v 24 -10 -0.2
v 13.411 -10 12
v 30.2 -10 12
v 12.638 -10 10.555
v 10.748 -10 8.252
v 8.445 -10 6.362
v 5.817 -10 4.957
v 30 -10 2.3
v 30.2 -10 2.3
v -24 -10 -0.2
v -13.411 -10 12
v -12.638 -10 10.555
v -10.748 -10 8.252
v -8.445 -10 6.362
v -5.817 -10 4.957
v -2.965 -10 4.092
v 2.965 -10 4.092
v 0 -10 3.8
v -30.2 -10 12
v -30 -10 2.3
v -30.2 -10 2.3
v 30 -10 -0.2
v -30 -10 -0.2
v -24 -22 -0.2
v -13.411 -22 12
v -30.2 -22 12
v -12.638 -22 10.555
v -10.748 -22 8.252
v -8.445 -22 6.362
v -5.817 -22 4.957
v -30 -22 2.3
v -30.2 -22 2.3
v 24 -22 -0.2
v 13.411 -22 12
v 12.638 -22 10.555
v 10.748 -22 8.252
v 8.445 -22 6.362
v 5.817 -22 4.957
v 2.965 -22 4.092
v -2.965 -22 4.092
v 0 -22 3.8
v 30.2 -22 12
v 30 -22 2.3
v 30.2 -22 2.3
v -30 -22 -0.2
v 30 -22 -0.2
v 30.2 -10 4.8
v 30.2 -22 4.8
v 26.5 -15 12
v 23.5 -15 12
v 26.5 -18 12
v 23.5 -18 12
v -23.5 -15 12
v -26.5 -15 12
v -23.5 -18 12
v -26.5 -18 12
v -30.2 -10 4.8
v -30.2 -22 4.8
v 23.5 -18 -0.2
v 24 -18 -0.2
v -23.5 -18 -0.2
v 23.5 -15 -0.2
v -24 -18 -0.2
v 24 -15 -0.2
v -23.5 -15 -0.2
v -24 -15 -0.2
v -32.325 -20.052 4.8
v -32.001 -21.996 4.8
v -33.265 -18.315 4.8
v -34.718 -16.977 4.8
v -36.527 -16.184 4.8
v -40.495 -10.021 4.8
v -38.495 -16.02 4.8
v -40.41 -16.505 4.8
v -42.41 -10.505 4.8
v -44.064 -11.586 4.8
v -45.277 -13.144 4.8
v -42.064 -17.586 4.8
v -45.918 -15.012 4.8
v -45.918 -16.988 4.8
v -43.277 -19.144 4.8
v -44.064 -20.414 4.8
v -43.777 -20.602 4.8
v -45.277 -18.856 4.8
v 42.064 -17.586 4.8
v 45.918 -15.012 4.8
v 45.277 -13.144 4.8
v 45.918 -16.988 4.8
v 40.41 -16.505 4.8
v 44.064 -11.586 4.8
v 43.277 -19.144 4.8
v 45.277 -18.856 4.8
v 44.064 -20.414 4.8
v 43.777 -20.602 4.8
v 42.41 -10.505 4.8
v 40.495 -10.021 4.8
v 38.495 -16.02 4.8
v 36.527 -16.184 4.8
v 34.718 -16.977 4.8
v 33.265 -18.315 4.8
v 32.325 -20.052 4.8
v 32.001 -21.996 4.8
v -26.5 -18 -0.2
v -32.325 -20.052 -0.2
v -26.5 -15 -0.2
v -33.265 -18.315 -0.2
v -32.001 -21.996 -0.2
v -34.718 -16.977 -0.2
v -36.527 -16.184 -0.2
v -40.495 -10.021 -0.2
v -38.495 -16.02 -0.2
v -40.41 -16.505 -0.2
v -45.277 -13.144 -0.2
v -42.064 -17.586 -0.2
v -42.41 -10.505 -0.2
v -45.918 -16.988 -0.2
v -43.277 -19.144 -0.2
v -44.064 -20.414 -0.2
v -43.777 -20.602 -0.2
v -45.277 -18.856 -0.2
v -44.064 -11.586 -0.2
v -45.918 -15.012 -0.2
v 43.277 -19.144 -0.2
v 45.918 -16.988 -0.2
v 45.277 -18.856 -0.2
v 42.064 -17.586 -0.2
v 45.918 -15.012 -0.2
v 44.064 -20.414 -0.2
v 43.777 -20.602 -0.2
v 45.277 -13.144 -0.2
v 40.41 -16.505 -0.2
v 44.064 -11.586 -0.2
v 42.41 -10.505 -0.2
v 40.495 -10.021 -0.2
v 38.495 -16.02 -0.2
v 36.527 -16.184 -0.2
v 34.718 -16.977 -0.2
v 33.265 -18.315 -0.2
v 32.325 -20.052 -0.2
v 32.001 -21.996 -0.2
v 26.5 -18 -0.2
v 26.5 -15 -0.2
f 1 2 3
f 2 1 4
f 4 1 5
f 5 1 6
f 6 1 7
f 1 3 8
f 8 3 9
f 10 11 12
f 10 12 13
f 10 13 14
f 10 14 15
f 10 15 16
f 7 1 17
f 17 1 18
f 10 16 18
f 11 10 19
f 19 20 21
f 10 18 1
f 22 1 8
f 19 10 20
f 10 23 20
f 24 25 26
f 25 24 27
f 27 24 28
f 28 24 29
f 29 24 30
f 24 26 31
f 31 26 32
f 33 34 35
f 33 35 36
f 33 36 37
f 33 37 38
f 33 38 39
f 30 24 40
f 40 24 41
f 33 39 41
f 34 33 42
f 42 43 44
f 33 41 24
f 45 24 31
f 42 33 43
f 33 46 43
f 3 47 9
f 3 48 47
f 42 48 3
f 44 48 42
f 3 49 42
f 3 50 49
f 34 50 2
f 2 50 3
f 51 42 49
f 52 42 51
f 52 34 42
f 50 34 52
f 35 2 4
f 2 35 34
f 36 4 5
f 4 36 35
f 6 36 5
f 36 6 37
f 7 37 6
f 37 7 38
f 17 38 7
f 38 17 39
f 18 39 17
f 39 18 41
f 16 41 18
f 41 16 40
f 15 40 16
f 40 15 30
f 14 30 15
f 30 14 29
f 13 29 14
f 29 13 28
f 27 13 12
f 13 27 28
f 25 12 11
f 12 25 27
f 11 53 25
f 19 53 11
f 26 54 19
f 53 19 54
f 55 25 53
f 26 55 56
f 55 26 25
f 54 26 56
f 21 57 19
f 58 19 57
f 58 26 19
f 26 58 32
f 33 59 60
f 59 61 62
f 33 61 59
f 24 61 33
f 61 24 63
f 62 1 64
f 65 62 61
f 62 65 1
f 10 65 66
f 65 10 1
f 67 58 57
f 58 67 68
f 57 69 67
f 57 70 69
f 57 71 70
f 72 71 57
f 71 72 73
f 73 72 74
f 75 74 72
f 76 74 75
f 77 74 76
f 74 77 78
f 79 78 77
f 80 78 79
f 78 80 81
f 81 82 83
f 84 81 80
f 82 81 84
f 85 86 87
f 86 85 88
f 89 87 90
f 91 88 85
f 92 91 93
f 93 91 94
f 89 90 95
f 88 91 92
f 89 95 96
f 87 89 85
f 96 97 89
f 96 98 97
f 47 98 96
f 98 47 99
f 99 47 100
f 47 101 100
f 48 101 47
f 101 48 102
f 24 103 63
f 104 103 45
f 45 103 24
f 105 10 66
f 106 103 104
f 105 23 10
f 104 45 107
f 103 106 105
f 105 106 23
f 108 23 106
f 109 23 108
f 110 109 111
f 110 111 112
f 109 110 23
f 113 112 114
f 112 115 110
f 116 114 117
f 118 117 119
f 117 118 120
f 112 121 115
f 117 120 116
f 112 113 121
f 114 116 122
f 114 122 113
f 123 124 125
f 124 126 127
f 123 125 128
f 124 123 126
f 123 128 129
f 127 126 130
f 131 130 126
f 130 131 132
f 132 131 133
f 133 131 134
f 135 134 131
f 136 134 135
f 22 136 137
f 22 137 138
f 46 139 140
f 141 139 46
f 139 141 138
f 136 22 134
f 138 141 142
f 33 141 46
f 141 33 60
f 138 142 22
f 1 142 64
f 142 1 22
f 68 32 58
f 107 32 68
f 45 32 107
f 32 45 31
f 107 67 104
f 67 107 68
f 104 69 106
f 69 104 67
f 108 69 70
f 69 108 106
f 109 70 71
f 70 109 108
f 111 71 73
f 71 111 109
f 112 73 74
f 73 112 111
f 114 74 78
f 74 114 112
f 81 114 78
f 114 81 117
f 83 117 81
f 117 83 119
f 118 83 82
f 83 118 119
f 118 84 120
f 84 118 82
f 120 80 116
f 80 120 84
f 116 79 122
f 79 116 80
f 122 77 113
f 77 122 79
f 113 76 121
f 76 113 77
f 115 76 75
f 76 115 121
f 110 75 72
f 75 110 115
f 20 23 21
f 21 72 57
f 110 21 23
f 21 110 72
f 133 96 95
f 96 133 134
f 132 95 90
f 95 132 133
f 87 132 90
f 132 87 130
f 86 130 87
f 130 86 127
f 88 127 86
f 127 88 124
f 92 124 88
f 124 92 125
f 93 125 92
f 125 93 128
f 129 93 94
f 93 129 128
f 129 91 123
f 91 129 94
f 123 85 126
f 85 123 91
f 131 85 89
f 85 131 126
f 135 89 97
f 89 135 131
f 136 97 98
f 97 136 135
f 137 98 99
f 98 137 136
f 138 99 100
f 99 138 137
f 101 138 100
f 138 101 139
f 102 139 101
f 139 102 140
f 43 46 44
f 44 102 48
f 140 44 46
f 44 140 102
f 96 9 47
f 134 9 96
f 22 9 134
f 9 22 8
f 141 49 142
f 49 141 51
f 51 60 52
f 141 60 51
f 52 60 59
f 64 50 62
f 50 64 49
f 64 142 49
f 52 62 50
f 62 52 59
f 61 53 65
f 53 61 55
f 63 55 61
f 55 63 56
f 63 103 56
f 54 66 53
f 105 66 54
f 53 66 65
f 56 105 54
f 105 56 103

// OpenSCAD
module A_Nut() {    
  BOLT_SIZE=2.9;
  NUT_SIZE=6.3;

  difference(){
    cylinder(r=NUT_SIZE,$fn=6, h=5);
    
    translate([0,0,2])
      cylinder(r=NUT_SIZE/2,$fn=6, h=5);
    
    for(i=[0:60:360]) {
      rotate([0,0,i])
      translate([NUT_SIZE,0,0])
        cylinder(r=1,$fn=24,h=5);
    }
    
    cylinder(r=BOLT_SIZE/2,$fn=16, h=6);
  }
}


module B_ClampCrossSection(){
//  POLE1_OD=25.4;
  POLE1_OD=30.4;
  BOTTOM_SIZE=[POLE1_OD+15*2,10];

  difference() {
    union() {
      hull() {
        circle(r=(POLE1_OD+8)/2, $fn=32);

        scale([0.85,1])
        translate([0,-(POLE1_OD+8-BOTTOM_SIZE[1])/2])
        translate(BOTTOM_SIZE*-.5)
          square(BOTTOM_SIZE);
      }
      
      scale([1,1.67])
      translate([0,-5])
      translate(BOTTOM_SIZE*-.5)
        square(BOTTOM_SIZE);
      
    }
    
    circle(r=POLE1_OD/2, $fn=32);
  }
}

module C_ClampTop2D() {
  LINE_CUT=[100,2];
  HORIZON_CUT=[100,100];
  
  difference() {   
    B_ClampCrossSection();
    
    translate([0,-4])
    translate(LINE_CUT*-.5)
      square(LINE_CUT);
    
    translate([0,-55])
    translate(HORIZON_CUT*-.5)
      square(HORIZON_CUT);
  }
}

module C_ClampTop() {
  BOLT_HOLE=[3,20,3];
  difference() {  
    linear_extrude(height=7){
      C_ClampTop2D();
    }

    translate([50,-10,7]/2)
    translate(BOLT_HOLE*-.5)
      cube(BOLT_HOLE);
    
    translate([-50,-10,7]/2)
    translate(BOLT_HOLE*-.5)
      cube(BOLT_HOLE);
  }
}

module D_Hook2D() {
  translate([-40,0])
  difference() {
    hull(){
      circle(r=6);
      
      translate([10,-6])
        square([6,12]);
    }
    
    translate([2,6])
      circle(r=6);
  }
}

module D_Hooks(){
  translate([0,-14.2,6])
  rotate([90,0,0])
  linear_extrude(height=5) {
    D_Hook2D();
    
    mirror([1,0,0])    
      D_Hook2D();
  }
}

module D_ClampBottom() {
  BOLT_HOLE=[3,40,3];
  LINE_CUT=[100,2];
  HORIZON_CUT=[100,100];


  difference() {
    union() {
      // main piece
      linear_extrude(height=12){  
        difference() {
          B_ClampCrossSection();
          
          translate([0,-6])
          translate(LINE_CUT*-.5)
            square(LINE_CUT);
          
          translate([0,50-5])
          translate(HORIZON_CUT*-.5)
            square(HORIZON_CUT);
        }
      }
   
      // hooks
      D_Hooks();
    }
    
    translate([50,-15,13]/2)
    translate(BOLT_HOLE*-.5)
      cube(BOLT_HOLE);
    
    translate([-50,-15,13]/2)
    translate(BOLT_HOLE*-.5)
      cube(BOLT_HOLE);
  }
}

// C_ClampTop();

translate([0,-10,19])
rotate([90,0,0])
  D_ClampBottom();
